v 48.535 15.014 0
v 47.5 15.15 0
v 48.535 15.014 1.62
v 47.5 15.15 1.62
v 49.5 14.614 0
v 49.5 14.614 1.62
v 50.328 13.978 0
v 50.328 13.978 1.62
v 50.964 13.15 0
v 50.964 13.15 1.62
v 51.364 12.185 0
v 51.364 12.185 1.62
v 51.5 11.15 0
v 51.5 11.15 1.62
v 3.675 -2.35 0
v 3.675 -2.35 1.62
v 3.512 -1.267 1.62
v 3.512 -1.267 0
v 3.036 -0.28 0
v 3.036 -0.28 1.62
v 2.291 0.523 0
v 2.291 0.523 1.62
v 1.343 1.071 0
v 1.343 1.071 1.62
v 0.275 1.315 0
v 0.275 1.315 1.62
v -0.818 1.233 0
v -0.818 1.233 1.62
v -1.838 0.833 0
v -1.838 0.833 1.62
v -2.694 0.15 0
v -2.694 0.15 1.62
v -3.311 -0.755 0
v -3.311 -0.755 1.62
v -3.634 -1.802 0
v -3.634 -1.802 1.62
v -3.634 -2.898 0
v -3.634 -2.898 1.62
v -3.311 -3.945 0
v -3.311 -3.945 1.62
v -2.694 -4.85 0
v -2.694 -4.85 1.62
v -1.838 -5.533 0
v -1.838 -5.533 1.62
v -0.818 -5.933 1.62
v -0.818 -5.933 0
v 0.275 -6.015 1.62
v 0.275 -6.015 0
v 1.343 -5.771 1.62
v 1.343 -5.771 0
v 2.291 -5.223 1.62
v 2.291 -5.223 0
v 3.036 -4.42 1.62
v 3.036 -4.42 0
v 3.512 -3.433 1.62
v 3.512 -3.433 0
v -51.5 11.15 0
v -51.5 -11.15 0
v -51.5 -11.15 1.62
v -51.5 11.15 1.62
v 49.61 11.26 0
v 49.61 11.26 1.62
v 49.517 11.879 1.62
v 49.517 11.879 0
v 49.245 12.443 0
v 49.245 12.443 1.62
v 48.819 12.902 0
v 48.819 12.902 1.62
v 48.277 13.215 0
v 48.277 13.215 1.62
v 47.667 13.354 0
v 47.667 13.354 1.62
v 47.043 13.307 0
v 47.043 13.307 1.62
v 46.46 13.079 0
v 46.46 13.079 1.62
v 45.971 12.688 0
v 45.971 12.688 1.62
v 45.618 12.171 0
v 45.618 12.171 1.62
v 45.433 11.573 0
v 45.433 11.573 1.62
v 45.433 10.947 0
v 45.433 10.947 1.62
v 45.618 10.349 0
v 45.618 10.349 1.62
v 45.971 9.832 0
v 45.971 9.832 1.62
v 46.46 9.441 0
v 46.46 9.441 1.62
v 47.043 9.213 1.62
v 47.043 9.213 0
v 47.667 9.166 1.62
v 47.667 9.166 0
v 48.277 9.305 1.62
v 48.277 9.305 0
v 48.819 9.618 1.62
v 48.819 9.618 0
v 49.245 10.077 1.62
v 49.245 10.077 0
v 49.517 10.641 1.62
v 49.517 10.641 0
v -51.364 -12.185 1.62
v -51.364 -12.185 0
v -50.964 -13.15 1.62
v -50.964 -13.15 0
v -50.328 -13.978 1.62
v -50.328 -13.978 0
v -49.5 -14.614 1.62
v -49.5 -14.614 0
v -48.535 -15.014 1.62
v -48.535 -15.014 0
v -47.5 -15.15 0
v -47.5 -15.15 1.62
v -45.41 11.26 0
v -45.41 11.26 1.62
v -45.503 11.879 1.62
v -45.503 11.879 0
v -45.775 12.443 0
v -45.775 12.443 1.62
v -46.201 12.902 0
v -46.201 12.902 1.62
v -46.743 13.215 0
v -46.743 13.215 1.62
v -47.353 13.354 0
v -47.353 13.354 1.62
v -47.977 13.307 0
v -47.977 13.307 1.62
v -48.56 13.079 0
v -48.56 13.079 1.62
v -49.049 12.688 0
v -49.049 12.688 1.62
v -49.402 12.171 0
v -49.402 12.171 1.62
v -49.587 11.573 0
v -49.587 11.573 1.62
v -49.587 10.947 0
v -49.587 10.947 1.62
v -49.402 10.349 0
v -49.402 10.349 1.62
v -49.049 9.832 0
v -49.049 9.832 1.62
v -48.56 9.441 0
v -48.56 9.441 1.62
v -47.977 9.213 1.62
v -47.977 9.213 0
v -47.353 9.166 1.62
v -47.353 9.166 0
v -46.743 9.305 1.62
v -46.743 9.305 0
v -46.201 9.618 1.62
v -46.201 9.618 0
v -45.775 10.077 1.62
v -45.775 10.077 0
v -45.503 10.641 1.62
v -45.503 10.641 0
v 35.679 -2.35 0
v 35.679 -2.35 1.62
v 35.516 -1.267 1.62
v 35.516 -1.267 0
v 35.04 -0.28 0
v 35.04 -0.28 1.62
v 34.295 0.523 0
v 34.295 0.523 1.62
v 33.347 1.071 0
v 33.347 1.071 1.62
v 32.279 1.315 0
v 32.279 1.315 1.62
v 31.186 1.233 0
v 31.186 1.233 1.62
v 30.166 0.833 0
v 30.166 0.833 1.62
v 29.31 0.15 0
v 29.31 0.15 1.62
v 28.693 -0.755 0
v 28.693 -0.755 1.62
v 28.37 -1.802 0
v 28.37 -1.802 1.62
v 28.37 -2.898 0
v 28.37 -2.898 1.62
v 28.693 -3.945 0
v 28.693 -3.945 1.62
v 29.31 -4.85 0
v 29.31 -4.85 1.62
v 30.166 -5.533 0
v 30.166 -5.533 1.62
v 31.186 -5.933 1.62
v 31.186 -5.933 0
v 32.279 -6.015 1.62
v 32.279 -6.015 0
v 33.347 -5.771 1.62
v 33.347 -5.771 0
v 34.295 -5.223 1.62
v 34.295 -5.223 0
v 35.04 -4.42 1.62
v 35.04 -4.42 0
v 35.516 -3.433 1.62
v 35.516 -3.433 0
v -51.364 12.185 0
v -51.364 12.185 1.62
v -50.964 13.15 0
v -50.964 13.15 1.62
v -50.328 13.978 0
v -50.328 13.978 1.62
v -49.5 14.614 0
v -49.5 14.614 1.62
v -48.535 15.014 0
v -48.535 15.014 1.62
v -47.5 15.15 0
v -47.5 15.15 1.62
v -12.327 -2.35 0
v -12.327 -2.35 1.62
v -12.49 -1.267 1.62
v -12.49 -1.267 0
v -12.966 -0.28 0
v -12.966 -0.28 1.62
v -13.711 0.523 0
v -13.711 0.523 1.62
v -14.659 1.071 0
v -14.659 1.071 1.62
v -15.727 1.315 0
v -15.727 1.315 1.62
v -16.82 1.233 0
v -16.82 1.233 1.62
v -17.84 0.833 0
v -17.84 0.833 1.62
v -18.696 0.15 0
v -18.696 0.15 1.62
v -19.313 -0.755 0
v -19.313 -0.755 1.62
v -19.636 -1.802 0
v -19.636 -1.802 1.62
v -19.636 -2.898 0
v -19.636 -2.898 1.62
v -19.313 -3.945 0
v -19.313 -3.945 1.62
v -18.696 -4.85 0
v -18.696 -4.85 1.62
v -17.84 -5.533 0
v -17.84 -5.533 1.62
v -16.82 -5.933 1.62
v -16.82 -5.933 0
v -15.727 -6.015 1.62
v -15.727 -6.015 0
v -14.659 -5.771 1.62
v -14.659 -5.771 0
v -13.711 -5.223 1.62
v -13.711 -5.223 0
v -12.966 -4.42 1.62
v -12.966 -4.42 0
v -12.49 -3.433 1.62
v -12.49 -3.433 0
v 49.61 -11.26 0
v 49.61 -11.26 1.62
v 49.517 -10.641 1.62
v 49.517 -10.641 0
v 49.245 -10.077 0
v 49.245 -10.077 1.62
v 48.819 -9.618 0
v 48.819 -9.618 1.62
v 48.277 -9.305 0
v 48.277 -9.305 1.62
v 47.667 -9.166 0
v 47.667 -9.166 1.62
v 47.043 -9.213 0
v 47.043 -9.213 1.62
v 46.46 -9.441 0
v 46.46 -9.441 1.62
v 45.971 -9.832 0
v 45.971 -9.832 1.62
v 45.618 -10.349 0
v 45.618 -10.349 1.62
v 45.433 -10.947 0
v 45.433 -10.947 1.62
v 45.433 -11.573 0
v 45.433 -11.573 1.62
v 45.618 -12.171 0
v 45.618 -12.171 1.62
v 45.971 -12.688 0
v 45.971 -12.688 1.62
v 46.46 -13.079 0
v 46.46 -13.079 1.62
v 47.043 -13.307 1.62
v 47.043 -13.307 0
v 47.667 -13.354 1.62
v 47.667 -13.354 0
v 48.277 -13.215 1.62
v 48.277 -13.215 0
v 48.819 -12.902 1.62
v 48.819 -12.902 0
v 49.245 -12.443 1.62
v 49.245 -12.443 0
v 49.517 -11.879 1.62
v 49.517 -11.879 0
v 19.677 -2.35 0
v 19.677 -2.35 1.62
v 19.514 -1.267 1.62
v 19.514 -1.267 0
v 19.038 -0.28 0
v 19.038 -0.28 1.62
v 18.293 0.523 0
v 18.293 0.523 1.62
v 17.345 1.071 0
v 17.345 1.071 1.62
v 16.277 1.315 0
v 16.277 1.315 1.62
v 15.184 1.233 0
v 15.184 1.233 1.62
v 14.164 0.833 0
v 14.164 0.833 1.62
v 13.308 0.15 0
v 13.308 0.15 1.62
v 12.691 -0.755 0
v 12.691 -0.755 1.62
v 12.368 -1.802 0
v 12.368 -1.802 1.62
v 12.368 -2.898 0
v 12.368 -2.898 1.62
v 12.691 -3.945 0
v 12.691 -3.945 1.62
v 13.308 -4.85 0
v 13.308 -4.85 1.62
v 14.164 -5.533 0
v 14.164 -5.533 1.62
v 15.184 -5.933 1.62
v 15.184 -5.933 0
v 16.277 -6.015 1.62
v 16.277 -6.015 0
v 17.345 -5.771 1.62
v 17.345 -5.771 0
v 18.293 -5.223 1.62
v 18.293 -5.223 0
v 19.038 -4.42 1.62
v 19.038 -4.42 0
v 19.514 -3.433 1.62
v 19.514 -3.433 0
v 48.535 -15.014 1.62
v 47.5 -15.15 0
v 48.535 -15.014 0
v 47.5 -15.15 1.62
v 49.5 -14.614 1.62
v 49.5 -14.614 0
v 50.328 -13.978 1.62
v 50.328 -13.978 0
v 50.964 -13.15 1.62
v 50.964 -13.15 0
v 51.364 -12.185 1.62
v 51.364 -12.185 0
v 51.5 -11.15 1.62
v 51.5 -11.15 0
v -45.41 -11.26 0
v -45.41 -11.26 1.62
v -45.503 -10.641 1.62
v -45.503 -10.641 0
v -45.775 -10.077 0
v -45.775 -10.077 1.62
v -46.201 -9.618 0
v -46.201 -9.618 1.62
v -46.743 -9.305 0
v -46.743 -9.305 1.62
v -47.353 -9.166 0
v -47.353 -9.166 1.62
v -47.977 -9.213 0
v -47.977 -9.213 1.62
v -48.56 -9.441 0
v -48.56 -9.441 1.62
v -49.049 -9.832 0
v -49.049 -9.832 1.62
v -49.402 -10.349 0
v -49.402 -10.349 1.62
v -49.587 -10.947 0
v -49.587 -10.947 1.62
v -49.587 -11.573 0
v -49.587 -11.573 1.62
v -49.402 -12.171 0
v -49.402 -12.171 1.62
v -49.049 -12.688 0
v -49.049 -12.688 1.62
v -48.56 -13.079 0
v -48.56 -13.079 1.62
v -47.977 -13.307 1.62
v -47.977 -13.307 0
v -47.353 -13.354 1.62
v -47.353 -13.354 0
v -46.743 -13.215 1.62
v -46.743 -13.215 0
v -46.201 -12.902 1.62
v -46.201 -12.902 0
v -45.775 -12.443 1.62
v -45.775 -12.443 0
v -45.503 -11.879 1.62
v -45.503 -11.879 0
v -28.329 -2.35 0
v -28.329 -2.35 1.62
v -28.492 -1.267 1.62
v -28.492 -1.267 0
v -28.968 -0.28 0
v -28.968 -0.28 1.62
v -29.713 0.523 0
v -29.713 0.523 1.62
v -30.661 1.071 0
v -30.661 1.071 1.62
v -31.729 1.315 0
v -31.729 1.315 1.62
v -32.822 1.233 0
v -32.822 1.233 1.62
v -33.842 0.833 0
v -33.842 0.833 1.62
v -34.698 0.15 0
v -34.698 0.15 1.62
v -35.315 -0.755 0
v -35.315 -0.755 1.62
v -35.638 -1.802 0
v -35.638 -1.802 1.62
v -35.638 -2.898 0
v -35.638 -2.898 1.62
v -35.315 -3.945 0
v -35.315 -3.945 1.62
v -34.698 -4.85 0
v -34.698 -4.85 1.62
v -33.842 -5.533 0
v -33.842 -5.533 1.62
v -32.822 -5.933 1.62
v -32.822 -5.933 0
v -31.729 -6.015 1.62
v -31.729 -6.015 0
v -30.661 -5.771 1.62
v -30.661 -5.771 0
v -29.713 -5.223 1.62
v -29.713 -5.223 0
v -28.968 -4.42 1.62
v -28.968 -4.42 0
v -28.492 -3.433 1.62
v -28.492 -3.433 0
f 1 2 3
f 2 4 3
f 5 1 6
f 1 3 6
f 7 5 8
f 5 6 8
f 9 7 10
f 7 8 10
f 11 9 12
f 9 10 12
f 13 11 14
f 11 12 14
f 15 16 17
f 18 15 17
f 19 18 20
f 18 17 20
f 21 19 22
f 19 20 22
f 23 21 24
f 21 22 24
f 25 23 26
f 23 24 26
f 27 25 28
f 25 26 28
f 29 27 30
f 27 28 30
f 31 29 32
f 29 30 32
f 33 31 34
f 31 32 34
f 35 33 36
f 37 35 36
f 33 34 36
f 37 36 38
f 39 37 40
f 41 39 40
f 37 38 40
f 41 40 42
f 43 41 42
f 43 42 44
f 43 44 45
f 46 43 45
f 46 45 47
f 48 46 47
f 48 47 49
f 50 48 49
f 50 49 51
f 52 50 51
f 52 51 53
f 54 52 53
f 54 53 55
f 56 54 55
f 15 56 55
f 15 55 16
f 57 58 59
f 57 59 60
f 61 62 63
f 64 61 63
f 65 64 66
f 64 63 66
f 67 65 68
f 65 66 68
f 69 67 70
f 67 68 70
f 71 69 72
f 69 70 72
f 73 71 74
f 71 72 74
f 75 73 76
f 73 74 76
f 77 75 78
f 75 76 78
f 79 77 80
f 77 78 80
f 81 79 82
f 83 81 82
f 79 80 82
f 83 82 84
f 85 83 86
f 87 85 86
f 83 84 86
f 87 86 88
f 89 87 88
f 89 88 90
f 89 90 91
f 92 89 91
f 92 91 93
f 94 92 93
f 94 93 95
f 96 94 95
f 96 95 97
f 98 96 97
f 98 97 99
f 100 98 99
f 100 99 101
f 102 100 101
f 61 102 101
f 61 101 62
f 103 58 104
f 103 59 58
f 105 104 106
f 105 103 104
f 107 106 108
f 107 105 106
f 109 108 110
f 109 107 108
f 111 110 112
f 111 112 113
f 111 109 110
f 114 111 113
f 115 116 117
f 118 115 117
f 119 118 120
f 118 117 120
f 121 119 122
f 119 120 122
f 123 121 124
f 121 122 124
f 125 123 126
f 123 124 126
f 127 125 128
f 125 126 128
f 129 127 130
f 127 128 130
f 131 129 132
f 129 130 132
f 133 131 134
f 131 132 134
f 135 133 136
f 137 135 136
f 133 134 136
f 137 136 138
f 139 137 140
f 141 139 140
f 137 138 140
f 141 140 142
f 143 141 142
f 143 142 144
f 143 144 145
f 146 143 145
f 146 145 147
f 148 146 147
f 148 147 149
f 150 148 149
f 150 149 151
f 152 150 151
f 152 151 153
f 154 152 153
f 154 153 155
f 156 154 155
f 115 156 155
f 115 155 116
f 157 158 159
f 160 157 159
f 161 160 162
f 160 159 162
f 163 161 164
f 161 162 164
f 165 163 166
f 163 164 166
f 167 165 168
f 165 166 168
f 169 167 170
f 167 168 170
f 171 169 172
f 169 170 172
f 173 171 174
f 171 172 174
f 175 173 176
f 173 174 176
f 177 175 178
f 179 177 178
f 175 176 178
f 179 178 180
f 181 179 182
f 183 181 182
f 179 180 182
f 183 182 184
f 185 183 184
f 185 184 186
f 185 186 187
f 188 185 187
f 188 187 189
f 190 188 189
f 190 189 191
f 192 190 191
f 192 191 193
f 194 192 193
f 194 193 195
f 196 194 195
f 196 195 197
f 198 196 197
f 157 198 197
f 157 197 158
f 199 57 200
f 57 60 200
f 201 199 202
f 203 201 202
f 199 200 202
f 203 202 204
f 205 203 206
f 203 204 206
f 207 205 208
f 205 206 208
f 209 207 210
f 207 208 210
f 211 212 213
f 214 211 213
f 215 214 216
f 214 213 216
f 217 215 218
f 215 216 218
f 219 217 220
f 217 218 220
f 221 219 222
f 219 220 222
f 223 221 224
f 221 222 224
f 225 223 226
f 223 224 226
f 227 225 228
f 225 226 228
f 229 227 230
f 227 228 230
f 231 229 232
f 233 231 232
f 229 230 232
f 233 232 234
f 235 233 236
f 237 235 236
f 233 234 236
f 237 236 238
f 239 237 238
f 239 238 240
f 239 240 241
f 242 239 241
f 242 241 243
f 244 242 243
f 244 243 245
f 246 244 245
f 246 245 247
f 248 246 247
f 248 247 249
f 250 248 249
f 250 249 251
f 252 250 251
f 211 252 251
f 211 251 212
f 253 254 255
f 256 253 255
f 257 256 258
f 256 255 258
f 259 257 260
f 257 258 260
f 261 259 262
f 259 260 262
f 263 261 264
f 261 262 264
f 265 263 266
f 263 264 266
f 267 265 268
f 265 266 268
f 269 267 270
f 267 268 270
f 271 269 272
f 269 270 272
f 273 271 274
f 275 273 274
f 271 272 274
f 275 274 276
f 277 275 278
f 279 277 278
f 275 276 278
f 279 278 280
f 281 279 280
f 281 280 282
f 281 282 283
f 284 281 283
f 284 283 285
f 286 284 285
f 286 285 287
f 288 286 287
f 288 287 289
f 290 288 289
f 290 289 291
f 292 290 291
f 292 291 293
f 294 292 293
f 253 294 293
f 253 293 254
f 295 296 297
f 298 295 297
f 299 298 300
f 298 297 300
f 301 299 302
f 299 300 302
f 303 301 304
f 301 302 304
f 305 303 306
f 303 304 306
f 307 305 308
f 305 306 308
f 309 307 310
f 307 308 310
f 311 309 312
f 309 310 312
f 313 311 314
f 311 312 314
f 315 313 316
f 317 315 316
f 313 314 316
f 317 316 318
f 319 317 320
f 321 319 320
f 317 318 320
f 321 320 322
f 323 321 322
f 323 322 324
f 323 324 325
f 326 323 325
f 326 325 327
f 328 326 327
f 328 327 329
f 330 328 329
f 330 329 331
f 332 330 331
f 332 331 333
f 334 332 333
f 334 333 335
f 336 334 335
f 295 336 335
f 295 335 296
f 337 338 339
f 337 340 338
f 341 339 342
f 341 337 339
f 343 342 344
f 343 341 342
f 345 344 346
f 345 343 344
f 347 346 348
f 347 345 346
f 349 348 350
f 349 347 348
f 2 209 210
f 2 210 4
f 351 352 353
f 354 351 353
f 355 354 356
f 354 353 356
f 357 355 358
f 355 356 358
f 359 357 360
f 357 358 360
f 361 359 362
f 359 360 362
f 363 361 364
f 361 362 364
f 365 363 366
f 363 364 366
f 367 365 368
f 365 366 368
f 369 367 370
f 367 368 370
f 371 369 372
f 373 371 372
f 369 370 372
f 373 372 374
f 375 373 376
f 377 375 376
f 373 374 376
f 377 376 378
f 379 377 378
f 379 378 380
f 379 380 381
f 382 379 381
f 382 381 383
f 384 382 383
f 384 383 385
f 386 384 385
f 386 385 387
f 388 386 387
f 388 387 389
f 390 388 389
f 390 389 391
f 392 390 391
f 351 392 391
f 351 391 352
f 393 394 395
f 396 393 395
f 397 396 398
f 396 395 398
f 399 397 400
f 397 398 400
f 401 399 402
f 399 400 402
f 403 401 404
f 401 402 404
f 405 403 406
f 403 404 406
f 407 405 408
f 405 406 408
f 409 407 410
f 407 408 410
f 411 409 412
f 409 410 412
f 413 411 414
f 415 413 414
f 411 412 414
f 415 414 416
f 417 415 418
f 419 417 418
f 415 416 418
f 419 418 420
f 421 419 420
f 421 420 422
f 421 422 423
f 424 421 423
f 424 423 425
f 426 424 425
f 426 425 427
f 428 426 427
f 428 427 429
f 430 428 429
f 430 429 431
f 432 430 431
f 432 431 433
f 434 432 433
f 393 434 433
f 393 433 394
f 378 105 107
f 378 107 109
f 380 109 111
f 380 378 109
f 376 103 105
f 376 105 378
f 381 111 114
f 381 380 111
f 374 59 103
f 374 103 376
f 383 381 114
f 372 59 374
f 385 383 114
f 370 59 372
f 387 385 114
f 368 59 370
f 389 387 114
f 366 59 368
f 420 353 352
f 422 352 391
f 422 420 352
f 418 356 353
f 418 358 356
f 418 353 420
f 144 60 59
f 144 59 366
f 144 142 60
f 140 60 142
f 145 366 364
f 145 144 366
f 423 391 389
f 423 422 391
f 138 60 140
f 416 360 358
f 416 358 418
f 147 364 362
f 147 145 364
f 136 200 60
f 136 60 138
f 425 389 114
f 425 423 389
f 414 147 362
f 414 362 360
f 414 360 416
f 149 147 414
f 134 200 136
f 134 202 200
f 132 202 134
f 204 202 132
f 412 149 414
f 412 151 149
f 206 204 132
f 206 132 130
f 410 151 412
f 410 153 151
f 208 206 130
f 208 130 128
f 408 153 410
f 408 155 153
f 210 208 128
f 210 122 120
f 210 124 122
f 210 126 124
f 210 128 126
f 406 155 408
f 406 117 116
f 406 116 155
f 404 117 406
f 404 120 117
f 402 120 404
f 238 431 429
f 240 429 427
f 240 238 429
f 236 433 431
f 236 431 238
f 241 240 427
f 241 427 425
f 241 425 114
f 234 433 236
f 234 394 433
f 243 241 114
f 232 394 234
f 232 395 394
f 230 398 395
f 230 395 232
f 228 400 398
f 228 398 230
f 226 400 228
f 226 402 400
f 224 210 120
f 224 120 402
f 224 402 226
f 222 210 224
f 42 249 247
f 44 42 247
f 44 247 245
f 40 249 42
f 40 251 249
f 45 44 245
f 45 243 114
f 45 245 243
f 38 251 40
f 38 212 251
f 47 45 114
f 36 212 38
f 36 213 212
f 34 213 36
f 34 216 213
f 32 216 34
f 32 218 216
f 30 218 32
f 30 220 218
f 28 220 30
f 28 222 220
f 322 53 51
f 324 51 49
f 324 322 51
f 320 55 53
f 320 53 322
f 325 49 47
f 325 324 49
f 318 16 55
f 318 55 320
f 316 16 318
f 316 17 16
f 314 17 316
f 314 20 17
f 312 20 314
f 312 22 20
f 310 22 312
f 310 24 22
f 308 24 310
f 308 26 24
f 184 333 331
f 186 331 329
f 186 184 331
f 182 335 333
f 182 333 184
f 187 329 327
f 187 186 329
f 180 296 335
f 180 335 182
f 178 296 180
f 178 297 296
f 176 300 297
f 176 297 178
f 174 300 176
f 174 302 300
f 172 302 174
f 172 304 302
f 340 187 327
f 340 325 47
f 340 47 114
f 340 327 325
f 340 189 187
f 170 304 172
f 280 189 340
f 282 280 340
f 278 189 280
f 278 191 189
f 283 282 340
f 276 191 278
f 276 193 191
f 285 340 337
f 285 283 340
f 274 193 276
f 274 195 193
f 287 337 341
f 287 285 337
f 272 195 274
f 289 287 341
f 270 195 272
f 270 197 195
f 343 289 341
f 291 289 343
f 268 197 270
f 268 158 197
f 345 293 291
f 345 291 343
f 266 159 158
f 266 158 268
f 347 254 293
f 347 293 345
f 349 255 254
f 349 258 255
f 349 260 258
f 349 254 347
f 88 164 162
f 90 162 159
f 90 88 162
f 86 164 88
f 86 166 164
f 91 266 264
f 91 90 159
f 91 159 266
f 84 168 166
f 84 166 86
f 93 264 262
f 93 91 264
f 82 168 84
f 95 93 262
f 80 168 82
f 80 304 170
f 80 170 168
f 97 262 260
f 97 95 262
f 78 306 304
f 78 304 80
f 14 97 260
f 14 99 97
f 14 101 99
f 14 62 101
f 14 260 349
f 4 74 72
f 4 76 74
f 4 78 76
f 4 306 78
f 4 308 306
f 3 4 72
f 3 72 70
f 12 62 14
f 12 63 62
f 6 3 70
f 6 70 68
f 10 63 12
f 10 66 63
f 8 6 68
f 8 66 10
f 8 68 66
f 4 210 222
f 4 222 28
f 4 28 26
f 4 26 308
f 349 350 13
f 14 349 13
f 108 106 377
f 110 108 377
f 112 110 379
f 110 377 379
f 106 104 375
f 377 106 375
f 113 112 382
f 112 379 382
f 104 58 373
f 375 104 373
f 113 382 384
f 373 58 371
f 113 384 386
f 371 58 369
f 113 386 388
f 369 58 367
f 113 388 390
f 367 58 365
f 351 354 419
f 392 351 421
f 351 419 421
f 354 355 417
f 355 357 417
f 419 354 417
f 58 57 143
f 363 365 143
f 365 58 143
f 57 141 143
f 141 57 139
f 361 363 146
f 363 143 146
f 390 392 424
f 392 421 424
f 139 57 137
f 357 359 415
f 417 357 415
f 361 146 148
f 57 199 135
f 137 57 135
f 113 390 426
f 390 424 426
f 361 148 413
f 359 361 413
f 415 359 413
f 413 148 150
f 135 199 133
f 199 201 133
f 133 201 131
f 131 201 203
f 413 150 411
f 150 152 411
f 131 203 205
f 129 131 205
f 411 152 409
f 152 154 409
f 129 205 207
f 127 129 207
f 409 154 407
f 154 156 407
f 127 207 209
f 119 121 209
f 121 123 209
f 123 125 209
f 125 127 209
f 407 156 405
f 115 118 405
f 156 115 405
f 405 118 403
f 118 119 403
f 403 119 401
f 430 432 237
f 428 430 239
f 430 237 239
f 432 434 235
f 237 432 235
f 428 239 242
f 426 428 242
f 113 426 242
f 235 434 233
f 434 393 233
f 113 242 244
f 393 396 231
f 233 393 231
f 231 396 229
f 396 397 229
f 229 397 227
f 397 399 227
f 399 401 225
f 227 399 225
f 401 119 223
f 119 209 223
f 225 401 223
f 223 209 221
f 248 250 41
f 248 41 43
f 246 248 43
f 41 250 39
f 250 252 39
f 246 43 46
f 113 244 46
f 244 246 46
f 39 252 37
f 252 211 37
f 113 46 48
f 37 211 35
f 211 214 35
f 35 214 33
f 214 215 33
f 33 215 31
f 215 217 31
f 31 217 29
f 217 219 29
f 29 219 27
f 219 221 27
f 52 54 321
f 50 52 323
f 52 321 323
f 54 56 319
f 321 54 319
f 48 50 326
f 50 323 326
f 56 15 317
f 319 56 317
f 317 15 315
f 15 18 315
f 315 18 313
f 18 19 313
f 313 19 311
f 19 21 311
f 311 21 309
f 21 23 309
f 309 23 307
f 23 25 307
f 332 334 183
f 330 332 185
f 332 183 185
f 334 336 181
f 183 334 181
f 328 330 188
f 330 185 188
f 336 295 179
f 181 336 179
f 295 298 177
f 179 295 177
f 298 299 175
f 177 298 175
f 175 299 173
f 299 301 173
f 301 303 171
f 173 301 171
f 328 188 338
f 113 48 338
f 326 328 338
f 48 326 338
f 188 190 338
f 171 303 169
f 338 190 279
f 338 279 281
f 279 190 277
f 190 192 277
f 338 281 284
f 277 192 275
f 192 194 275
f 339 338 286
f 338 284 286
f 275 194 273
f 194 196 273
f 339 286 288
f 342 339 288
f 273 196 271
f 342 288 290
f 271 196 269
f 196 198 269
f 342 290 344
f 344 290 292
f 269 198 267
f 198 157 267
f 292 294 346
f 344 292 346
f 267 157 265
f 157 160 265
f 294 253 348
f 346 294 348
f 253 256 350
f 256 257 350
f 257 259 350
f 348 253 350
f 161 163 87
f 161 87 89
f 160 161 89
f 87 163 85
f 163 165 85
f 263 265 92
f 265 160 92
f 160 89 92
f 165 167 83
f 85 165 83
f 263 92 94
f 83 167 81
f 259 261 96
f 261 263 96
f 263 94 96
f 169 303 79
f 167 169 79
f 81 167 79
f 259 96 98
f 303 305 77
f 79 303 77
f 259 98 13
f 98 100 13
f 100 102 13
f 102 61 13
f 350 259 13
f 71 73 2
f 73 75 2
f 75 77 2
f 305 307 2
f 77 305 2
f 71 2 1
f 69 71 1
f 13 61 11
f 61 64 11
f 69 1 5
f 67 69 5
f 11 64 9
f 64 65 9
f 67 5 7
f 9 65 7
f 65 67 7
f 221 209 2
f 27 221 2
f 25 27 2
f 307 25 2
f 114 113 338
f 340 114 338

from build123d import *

# Parameters (mm, degrees)
SKETCH_W        = 103
SKETCH_H        = 30.3
PAD_DEPTH       = 1.62
SKETCH001_R     = 2.1
POCKET_DEPTH    = 5
SKETCH002_R     = 3.675
POCKET001_DEPTH = 5
FILLET_R        = 4


with BuildPart() as part:
    # Sketch → Pad (new body)
    with BuildSketch(Plane.XY):
        Rectangle(SKETCH_W, SKETCH_H)
    extrude(amount=PAD_DEPTH)

    # Sketch001 → Pocket (cut)
    with BuildSketch(Plane.XY.offset(1.62)):
        with Locations((-47.51, 11.26)):
            Circle(SKETCH001_R)
        with Locations((47.51, 11.26)):
            Circle(SKETCH001_R)
        with Locations((-47.51, -11.26)):
            Circle(SKETCH001_R)
        with Locations((47.51, -11.26)):
            Circle(SKETCH001_R)
    extrude(amount=-POCKET_DEPTH, mode=Mode.SUBTRACT)

    # Sketch002 → Pocket001 (cut)
    with BuildSketch(Plane.XY.offset(1.62)):
        with Locations((-32.004, -2.35)):
            Circle(SKETCH002_R)
        with Locations((-16.002, -2.35)):
            Circle(SKETCH002_R)
        with Locations((0, -2.35)):
            Circle(SKETCH002_R)
        with Locations((16.002, -2.35)):
            Circle(SKETCH002_R)
        with Locations((32.004, -2.35)):
            Circle(SKETCH002_R)
    extrude(amount=-POCKET001_DEPTH, mode=Mode.SUBTRACT)

    # Fillet
    fillet_edges = [part.edges().sort_by_distance(p)[0] for p in [
        (-51.5, -15.15, 0.81),
        (-51.5, 15.15, 0.81),
        (51.5, -15.15, 0.81),
        (51.5, 15.15, 0.81),
    ]]
    fillet(fillet_edges, radius=FILLET_R)


solid = part.part
